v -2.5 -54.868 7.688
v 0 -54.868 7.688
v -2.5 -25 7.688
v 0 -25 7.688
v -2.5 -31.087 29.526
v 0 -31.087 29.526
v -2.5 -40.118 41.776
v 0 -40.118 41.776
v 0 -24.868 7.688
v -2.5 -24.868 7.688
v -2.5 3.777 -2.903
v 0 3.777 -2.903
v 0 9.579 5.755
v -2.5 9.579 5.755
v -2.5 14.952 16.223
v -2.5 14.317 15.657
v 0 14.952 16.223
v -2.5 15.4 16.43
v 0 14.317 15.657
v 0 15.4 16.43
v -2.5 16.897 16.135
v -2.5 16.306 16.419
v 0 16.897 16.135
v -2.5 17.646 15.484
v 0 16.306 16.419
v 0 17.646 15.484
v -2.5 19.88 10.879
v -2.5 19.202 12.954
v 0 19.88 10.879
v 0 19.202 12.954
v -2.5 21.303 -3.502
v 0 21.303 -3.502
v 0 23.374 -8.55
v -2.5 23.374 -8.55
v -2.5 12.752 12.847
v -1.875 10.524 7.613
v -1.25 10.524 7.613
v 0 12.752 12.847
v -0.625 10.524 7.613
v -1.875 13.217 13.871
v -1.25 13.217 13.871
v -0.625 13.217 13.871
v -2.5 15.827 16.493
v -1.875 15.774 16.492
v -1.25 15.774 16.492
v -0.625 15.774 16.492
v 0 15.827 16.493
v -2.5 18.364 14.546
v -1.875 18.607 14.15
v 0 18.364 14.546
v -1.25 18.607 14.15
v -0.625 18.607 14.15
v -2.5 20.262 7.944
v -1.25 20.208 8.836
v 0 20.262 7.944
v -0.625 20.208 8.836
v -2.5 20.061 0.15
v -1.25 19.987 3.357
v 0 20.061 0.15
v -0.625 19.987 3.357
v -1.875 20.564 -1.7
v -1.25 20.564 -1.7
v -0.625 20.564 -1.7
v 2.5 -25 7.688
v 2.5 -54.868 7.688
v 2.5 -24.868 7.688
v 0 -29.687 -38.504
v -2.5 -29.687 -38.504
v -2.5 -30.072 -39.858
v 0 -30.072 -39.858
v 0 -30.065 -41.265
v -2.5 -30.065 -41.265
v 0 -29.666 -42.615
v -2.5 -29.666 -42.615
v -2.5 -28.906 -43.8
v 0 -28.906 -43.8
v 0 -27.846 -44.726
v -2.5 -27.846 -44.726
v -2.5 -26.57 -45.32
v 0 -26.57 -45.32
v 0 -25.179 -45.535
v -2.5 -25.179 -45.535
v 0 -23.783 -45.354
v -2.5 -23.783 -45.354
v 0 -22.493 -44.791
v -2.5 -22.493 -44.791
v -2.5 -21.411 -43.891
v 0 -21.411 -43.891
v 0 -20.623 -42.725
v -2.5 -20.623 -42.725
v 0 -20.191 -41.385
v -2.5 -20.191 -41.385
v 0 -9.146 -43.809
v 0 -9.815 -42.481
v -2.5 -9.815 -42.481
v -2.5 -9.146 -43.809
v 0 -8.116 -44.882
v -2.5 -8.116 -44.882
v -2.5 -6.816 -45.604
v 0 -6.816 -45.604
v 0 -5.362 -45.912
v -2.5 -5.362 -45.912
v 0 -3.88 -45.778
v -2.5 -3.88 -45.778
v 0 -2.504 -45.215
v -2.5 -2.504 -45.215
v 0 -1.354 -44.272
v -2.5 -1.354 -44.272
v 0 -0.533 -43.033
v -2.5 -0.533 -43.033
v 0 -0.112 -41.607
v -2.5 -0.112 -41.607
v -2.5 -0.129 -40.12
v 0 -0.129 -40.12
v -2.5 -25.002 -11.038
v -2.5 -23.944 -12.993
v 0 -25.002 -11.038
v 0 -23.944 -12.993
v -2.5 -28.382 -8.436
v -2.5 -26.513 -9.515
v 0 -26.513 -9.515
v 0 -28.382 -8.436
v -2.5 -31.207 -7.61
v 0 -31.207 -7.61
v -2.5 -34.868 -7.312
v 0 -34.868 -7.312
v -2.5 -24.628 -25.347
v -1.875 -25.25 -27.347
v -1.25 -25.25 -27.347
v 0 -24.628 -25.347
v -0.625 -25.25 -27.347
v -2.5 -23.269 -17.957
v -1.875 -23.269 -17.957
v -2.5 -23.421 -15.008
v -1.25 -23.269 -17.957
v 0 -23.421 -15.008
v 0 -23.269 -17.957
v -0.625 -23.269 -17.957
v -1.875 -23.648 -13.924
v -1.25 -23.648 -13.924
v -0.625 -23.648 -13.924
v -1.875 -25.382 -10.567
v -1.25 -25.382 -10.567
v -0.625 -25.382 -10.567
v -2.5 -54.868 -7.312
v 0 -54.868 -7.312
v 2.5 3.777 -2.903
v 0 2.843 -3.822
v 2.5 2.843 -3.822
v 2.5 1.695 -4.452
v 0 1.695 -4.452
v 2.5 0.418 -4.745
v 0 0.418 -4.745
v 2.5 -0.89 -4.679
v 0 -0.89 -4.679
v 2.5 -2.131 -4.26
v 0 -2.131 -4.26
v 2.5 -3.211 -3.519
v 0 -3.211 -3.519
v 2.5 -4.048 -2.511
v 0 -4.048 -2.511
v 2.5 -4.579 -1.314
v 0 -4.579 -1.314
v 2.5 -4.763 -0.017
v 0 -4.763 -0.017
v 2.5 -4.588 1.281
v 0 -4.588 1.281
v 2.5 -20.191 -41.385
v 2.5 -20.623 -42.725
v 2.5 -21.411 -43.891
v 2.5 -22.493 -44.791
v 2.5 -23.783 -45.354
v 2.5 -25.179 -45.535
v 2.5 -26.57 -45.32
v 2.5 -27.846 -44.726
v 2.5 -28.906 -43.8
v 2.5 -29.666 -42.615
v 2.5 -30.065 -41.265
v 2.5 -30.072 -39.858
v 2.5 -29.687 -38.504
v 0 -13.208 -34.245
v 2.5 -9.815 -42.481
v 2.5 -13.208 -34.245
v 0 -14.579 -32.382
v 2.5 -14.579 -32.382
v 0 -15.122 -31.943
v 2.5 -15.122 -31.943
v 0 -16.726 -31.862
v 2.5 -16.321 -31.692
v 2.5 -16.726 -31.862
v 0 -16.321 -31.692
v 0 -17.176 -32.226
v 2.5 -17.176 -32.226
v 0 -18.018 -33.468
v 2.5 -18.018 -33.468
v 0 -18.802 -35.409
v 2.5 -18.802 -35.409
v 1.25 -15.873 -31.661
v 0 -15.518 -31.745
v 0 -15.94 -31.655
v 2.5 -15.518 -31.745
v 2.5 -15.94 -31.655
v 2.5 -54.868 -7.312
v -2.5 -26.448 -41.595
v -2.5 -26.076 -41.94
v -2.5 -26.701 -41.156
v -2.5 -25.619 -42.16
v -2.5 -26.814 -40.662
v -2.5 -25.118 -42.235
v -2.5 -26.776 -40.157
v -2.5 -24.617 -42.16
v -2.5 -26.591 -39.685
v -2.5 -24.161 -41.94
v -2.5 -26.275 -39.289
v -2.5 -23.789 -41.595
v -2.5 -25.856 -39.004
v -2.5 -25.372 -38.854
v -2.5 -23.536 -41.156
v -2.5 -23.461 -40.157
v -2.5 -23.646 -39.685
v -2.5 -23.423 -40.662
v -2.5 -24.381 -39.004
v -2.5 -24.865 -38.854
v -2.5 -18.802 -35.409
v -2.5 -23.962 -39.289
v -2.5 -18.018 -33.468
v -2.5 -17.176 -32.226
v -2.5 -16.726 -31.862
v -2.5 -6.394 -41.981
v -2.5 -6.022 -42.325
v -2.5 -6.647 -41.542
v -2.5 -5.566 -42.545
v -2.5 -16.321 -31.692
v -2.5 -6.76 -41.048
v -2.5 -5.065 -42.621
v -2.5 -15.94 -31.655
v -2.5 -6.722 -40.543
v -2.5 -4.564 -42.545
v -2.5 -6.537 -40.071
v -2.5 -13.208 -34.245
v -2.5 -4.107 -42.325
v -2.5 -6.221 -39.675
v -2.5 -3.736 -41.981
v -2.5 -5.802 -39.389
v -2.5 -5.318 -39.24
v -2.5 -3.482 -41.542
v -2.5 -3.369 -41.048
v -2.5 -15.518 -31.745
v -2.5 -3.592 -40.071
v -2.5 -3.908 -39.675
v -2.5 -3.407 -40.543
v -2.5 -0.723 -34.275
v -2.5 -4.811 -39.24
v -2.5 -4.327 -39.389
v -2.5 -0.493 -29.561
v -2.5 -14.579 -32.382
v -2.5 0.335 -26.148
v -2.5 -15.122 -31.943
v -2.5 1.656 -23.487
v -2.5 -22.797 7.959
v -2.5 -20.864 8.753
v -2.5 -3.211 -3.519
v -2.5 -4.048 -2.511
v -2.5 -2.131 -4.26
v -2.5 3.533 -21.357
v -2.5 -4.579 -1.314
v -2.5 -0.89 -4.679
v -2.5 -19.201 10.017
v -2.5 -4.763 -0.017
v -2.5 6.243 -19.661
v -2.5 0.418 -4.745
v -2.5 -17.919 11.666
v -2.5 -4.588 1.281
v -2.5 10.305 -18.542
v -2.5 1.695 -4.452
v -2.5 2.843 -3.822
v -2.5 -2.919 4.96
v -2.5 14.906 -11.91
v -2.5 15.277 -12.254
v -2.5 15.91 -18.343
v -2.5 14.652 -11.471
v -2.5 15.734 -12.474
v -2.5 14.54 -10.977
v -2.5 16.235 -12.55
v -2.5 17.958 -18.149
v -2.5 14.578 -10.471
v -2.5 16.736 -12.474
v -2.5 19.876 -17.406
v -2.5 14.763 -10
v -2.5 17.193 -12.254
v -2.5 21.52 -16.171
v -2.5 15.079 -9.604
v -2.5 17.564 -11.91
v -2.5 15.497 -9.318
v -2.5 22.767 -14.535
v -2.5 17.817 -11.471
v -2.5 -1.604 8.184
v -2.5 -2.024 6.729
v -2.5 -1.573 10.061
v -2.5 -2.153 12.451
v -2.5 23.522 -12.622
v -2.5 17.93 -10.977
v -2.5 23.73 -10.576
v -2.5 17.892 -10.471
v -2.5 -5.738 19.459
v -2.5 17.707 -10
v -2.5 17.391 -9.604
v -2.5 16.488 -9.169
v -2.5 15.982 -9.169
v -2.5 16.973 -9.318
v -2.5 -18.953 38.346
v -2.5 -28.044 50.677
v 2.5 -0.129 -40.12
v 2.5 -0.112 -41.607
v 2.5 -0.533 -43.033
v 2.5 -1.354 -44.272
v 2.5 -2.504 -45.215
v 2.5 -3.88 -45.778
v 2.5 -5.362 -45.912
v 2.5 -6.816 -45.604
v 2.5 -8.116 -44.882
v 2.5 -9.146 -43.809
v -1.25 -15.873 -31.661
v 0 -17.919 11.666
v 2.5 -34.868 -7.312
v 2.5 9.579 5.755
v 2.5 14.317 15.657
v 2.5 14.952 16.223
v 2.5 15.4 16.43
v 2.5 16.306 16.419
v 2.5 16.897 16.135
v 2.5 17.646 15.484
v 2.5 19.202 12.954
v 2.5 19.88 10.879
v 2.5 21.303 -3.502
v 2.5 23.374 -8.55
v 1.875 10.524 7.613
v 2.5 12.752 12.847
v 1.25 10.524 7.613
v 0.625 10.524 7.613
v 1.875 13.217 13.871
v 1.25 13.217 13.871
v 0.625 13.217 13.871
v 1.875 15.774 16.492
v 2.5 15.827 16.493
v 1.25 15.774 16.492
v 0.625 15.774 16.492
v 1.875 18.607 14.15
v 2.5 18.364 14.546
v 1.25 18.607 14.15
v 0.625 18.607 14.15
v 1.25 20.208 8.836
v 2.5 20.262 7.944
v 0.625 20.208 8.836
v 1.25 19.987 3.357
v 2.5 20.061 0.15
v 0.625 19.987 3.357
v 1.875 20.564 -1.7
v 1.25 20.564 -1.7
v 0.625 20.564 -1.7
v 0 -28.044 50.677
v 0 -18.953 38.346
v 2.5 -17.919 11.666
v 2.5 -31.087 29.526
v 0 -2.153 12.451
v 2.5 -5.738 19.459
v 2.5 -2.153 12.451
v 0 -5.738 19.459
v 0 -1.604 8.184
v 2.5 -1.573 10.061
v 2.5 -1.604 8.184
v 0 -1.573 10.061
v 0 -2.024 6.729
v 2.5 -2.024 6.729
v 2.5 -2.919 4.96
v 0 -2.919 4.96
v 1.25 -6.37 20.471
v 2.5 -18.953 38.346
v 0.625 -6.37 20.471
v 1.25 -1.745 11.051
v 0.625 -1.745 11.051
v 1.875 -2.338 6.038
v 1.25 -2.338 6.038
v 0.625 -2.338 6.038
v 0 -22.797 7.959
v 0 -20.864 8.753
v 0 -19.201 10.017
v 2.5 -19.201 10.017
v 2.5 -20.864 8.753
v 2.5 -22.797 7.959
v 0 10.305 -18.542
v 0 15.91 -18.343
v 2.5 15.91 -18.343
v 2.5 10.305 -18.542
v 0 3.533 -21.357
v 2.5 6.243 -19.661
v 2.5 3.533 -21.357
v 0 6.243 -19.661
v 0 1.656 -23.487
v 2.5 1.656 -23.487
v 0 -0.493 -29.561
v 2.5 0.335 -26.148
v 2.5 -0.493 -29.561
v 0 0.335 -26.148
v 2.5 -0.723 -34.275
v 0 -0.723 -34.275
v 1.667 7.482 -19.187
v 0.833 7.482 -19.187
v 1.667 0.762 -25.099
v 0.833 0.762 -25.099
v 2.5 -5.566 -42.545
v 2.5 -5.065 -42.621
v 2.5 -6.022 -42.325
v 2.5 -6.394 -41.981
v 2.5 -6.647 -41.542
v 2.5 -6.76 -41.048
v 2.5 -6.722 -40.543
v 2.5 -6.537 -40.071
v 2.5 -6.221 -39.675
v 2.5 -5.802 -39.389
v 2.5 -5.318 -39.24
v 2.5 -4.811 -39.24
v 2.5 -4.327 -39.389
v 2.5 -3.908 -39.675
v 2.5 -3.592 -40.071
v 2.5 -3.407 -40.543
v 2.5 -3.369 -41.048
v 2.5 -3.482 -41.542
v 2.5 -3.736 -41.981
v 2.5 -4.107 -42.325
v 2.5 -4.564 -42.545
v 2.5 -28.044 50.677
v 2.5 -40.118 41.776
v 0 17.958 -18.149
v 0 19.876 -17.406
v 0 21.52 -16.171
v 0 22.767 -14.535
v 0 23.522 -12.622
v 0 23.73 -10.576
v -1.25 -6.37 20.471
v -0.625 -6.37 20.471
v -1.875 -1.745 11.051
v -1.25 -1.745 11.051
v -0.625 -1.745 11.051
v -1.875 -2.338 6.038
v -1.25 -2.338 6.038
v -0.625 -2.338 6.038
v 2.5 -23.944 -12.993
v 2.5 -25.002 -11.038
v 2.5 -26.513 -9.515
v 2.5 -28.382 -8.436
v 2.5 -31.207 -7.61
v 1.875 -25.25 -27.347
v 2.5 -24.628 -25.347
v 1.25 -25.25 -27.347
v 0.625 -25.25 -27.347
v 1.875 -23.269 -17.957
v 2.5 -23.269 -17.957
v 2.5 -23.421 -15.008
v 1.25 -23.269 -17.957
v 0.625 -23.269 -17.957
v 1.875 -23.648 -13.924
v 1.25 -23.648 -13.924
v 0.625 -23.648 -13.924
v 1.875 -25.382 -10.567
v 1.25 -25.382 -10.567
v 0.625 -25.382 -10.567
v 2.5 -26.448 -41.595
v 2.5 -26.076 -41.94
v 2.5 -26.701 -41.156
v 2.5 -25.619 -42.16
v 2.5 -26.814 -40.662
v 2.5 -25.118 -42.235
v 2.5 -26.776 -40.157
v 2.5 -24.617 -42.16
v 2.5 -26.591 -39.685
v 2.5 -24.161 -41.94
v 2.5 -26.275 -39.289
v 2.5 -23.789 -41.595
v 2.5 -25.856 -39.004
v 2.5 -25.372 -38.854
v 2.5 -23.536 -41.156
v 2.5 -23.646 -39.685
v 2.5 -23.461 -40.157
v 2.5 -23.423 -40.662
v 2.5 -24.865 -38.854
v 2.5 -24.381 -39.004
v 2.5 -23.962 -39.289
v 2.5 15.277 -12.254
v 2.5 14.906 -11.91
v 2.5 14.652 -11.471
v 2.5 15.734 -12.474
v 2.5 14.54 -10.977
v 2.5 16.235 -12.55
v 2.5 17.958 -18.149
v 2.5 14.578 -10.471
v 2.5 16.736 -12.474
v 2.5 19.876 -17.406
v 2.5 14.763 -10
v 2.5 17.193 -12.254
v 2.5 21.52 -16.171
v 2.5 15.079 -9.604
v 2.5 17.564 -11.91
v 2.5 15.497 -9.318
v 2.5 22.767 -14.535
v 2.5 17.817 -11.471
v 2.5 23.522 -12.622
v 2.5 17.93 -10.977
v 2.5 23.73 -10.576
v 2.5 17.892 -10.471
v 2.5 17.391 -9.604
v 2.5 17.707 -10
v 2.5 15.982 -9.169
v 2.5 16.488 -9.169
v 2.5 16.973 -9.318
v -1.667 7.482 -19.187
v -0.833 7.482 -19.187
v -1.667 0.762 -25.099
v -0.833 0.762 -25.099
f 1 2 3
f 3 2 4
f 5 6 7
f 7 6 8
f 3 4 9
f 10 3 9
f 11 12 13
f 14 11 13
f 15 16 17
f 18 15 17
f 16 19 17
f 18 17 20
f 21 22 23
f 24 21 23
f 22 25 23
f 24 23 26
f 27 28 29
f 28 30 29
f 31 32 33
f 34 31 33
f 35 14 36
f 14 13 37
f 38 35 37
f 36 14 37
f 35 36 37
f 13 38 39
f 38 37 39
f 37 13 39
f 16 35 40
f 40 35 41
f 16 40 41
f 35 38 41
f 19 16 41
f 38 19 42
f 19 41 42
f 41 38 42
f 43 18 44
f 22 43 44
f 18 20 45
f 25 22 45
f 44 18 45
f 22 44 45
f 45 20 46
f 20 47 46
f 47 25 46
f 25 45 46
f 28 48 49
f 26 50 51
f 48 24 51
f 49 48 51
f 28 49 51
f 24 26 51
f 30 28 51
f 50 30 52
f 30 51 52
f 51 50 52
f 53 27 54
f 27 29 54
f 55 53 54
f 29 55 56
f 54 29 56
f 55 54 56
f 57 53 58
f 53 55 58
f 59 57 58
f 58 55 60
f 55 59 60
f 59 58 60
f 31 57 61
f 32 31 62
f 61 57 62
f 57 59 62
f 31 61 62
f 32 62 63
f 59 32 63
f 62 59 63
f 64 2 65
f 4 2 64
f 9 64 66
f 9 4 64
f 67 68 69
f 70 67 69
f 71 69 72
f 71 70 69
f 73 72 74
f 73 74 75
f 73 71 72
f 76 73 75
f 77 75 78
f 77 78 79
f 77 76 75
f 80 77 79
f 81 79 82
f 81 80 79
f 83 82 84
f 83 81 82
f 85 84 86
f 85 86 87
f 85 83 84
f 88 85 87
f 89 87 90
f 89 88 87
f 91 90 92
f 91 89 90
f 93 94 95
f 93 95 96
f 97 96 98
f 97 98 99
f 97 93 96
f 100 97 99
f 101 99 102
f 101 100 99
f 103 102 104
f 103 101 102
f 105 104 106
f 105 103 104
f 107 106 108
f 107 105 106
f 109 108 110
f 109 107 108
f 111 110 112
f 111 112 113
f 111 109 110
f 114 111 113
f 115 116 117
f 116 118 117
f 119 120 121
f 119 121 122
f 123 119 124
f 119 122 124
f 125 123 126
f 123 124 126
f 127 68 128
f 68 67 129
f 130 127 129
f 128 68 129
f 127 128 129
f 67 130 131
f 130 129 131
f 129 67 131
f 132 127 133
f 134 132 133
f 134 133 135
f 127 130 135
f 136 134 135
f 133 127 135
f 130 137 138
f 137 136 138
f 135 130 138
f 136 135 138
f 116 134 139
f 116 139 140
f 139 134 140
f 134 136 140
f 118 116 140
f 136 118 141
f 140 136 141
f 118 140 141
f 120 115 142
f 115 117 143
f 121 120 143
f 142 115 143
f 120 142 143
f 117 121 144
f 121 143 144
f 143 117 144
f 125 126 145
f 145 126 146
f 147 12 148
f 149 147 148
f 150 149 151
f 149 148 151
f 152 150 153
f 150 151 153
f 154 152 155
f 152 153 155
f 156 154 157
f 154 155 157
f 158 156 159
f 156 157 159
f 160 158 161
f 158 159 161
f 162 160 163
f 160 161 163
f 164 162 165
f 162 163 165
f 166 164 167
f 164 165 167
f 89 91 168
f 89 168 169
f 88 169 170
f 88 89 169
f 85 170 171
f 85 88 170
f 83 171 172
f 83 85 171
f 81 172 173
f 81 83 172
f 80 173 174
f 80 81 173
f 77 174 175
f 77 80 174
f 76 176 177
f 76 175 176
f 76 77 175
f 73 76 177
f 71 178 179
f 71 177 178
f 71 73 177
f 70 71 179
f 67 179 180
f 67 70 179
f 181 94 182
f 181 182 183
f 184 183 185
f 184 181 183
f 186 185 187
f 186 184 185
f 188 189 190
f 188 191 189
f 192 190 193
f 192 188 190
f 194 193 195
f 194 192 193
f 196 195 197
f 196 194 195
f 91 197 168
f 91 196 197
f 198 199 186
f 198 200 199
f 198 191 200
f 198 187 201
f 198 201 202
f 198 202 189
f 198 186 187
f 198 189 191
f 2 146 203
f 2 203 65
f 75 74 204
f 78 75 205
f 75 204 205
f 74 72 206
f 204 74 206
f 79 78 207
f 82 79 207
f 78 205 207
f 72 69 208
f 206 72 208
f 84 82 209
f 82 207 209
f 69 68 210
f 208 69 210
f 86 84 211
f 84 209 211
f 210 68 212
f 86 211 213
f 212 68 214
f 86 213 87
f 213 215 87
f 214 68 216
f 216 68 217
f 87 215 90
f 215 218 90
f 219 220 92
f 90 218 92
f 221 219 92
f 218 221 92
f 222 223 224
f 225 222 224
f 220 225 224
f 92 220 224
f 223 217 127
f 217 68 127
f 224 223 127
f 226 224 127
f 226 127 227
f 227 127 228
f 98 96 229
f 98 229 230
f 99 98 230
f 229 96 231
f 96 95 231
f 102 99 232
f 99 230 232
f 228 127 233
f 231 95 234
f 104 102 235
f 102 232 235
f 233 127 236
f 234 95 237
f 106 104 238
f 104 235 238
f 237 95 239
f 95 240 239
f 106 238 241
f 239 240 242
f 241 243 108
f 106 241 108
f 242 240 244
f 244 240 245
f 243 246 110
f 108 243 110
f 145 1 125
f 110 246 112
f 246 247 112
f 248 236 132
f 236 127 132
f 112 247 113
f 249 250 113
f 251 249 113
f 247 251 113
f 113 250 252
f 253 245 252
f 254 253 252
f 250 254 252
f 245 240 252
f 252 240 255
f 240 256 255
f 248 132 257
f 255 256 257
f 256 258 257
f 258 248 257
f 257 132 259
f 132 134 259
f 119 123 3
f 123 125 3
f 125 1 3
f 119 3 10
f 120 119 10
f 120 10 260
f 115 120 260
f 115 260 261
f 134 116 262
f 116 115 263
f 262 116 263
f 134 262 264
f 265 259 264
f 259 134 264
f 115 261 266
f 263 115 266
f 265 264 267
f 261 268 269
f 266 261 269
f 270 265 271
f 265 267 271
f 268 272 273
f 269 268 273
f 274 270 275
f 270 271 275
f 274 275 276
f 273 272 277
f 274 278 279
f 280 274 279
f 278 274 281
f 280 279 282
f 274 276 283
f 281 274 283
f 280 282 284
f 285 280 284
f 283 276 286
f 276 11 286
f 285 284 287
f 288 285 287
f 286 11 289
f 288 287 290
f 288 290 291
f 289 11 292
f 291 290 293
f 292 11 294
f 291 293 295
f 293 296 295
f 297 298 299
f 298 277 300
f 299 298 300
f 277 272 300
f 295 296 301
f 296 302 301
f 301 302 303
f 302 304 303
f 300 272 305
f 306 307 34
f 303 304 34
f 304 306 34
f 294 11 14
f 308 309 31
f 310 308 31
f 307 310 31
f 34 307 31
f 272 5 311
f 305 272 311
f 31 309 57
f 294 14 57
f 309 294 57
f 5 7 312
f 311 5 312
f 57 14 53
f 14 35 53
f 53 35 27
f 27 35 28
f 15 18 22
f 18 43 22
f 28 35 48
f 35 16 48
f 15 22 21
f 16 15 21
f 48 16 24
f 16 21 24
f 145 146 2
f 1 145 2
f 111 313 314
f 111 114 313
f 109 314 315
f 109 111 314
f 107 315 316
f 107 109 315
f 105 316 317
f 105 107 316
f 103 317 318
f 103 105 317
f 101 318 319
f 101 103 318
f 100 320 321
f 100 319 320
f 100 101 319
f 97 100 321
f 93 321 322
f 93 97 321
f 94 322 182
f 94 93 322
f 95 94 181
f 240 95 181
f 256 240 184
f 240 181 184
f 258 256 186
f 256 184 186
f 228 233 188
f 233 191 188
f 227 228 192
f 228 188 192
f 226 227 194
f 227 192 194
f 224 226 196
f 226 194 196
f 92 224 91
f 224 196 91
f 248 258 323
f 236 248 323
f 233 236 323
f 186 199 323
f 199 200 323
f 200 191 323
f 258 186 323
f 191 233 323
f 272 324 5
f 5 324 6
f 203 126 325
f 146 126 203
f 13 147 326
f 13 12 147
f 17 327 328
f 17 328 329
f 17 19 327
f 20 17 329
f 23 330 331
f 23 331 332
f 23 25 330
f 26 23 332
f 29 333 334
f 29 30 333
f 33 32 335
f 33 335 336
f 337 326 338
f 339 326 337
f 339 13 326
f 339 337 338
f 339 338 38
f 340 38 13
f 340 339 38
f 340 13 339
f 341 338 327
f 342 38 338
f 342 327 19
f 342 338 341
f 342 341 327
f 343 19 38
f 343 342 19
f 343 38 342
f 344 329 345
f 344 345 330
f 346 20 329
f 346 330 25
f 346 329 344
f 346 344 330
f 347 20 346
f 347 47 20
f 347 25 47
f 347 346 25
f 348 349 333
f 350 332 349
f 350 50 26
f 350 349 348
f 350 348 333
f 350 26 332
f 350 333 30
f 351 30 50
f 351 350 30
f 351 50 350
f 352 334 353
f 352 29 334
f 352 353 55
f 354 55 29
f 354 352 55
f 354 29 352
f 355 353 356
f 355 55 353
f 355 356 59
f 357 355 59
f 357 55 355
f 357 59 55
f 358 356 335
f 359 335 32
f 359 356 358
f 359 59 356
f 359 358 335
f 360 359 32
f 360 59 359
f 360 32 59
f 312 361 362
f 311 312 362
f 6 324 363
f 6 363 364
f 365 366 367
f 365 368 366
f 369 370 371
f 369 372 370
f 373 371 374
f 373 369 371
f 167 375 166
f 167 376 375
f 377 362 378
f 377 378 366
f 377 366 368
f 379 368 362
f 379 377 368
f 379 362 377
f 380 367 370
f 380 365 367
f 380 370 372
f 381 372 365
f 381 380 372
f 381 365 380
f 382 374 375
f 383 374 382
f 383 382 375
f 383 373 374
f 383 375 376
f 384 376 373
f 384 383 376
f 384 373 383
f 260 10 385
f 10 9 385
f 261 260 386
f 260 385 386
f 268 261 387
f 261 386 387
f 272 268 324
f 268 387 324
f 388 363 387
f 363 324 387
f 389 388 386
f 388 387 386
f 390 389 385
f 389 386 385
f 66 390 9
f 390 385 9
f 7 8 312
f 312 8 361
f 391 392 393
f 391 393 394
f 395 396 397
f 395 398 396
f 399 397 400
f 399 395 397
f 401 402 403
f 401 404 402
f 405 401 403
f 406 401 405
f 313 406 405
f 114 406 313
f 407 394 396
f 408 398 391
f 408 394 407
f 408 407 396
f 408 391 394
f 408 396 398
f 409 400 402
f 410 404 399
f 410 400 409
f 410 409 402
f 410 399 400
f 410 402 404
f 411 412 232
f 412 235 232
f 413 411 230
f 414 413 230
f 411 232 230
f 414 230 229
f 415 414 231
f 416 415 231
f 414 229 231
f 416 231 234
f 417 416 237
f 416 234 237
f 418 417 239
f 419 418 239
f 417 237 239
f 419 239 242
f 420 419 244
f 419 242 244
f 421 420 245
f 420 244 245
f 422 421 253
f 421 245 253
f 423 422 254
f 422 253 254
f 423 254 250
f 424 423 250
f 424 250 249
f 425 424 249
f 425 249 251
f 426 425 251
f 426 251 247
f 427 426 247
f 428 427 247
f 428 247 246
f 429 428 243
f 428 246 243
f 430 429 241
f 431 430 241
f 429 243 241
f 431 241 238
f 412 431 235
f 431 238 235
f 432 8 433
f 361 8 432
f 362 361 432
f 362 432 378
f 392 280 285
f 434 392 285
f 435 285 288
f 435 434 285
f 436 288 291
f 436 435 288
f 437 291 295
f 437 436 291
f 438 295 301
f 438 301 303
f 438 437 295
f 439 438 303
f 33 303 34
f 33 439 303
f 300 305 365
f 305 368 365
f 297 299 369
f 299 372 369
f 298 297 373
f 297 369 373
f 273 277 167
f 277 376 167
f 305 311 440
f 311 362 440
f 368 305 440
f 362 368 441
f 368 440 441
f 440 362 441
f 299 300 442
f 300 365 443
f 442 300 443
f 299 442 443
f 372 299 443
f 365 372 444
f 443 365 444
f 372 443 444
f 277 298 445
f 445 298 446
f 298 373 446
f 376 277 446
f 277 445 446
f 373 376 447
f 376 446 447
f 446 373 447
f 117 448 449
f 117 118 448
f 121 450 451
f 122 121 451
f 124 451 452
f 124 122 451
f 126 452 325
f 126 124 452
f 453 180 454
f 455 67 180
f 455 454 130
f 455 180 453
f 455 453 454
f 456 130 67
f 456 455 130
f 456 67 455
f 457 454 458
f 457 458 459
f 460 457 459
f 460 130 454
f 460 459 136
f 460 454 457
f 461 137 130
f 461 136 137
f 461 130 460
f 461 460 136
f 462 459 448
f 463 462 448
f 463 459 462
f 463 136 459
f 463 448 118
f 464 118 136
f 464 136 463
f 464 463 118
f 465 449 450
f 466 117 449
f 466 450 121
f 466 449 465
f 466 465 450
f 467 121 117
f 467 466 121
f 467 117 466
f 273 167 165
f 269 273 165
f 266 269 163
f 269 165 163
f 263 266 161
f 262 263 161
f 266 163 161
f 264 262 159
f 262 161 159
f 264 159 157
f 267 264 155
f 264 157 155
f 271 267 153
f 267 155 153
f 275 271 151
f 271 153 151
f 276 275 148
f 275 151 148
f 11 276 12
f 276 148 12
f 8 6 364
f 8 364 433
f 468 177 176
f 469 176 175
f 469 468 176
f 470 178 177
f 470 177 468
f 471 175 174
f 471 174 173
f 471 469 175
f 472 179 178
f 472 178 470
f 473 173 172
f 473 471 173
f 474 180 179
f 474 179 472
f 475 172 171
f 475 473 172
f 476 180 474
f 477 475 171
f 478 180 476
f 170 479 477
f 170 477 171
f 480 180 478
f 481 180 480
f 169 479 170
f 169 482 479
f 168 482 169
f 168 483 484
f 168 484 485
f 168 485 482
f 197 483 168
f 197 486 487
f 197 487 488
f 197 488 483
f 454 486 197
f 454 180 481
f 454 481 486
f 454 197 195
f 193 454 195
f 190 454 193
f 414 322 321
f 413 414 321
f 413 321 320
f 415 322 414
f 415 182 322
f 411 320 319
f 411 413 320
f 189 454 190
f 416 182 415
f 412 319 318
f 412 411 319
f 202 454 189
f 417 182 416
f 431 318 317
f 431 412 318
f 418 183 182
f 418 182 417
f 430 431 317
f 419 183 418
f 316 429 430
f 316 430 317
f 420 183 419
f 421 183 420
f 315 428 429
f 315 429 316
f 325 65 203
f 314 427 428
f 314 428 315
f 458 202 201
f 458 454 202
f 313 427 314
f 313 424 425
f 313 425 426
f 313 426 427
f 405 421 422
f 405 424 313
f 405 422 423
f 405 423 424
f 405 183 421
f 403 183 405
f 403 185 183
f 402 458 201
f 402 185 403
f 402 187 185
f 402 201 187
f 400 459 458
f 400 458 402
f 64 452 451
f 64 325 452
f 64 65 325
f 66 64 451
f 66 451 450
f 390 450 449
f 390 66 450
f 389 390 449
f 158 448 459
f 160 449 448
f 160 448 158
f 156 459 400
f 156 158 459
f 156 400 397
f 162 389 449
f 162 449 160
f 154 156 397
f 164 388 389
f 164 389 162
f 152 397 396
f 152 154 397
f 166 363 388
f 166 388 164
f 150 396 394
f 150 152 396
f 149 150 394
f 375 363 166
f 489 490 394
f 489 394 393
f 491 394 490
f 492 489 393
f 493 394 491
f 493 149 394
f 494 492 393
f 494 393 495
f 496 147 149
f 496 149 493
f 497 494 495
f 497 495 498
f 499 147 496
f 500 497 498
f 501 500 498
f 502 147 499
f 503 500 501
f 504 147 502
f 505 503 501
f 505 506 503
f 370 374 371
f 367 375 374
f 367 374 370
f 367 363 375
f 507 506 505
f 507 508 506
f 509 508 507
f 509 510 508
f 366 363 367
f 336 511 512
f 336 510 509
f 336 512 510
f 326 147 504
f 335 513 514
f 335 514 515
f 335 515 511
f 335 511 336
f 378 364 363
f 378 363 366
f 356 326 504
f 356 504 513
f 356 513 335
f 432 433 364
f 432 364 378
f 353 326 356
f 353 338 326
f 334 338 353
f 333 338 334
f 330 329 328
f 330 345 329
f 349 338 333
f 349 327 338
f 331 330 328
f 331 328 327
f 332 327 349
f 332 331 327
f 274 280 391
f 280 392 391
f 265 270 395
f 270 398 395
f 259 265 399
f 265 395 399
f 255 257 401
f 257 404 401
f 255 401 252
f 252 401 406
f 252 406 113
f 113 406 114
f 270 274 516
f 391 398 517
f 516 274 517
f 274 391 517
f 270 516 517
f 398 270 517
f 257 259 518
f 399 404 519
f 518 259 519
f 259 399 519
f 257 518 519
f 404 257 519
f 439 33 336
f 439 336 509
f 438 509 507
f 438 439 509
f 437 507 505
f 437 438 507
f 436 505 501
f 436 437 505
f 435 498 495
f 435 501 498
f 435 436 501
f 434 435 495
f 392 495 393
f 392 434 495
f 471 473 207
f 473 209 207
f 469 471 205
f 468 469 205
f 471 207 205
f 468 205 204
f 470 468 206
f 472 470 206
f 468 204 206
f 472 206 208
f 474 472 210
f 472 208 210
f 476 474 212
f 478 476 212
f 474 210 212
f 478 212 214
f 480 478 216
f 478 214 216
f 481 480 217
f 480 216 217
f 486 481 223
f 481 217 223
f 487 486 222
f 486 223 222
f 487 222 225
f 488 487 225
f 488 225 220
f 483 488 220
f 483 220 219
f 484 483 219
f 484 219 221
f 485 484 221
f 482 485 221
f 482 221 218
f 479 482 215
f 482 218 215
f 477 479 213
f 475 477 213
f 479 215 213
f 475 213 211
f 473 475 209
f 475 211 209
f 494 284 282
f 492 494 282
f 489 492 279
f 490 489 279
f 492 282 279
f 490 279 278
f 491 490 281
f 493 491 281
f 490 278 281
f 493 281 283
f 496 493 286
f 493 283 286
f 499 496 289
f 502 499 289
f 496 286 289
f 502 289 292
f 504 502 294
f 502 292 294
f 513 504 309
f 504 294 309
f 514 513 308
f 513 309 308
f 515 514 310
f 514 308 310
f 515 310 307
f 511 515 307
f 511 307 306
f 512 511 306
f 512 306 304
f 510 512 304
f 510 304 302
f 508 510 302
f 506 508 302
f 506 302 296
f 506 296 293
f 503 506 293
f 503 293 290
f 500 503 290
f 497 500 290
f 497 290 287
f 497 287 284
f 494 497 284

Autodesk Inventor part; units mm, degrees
ref_plane "YZ Plane" through (0, 0, 0) normal (1, 0, 0) x (0, 1, 0)
ref_plane "XZ Plane" through (0, 0, 0) normal (0, 1, 0) x (-1, 0, 0)
ref_plane "XY Plane" through (0, 0, 0) normal (0, 0, 1) x (1, 0, 0)
sketch "Boceto1" plane through (0, 0, 0) normal (1, 0, 0) x (0, 1, 0)
  line L0 (-20.1912, -7.3118) -> (-34.868, -7.3118) construction
  spline S0 degree 4 poles (-29.6871, -38.5039) (-24.1556, -26.0638) (-21.7281, -18) (-20.1912, -7.3118) (-34.868, -7.3118) knots 21.570729 21.570729 21.570729 21.570729 21.570729 22 22 22 22 22
  line L1 (-29.6871, -38.5039) -> (-24.1556, -26.0638) construction
  line L2 (-24.1556, -26.0638) -> (-21.7281, -18) construction
  line L3 (-21.7281, -18) -> (-20.1912, -7.3118) construction
  line L4 (-50, 13.9603) -> (0, 0) construction
  line L5 (0, 0) -> (-50, 0) construction
  arc A0 (-29.6871, -38.5039) -> (-20.1912, -41.3852) centre (-25.1184, -40.5354) ccw
  line L6 (-16.7423, -21.3881) -> (-20.1912, -41.3852) construction
  spline S1 degree 2 poles (-9.815, -42.481) (-16.7423, -21.3881) (-20.1912, -41.3852) knots 1 1 1 2 2 2
  line L7 (-9.815, -42.481) -> (-16.7423, -21.3881) construction
  line L8 (2.3245, 8.0391) -> (-2.902, 7.319) construction
  spline S2 degree 4 poles (-18.9531, 38.3459) (-1.6814, 14.9192) (2.3245, 8.0391) (-2.902, 7.319) (-4.5878, 1.2809) knots 1 1 1 1 1 2 2 2 2 2
  line L9 (-18.9531, 38.3459) -> (-1.6814, 14.9192) construction
  line L10 (-1.6814, 14.9192) -> (2.3245, 8.0391) construction
  line L11 (-2.902, 7.319) -> (-4.5878, 1.2809) construction
  line L12 (3.7767, -2.9026) -> (9.4181, 4.4375) construction
  spline S3 degree 4 poles (3.7767, -2.9026) (9.4181, 4.4375) (12.4291, 11.3201) (14.6356, 22.4473) (23.4504, 7.8788) (17.807, 0.7674) (21.8821, -3.919) (23.3738, -8.5503) knots 0 0 0 0 0 1 2 3 4 4 4 4 4
  line L13 (9.4181, 4.4375) -> (12.4291, 11.3201) construction
  line L14 (12.4291, 11.3201) -> (14.6356, 22.4473) construction
  line L15 (14.6356, 22.4473) -> (23.4504, 7.8788) construction
  line L16 (23.4504, 7.8788) -> (17.807, 0.7674) construction
  line L17 (17.807, 0.7674) -> (21.8821, -3.919) construction
  line L18 (21.8821, -3.919) -> (23.3738, -8.5503) construction
  circle A1 centre (0, 0) radius 4.7633
  arc A2 (15.9103, -18.3426) -> (23.3738, -8.5503) centre (16.2349, -10.8497) ccw
  line L19 (-34.0809, 46.2261) -> (0, 0) construction
  arc A3 (-9.815, -42.481) -> (-0.1292, -40.1199) centre (-5.0647, -40.9208) ccw
  line L20 (-3.5244, -19.1976) -> (-0.1292, -40.1199) construction
  spline S4 degree 3 poles (15.9103, -18.3426) (8, -18) (-3.5244, -19.1976) (-0.1292, -40.1199) knots 1 1 1 1 2 2 2 2
  line L21 (15.9103, -18.3426) -> (8, -18) construction
  line L22 (8, -18) -> (-3.5244, -19.1976) construction
  line L23 (-31.0868, 29.5264) -> (-40.1176, 41.7755)
  line L24 (-28.0441, 50.6768) -> (-18.9531, 38.3459)
  line L25 (-40.1176, 41.7755) -> (-28.0441, 50.6768)
  line L26 (-34.868, -7.3118) -> (-54.868, -7.3118)
  line L27 (-54.868, -7.3118) -> (-54.868, 7.6882)
  line L28 (-54.868, 7.6882) -> (-25, 7.6882)
  line L29 (-25, 7.6882) -> (-24.868, 7.6882)
  arc A4 (-24.868, 7.6882) -> (-17.9191, 11.6663) centre (-24.868, 15.7464) ccw
  line L30 (-17.9191, 11.6663) -> (-31.0868, 29.5264)
  point P0 (3.7768, -2.9026)
  dimension "d1" = 38
  dimension "d3" = 9.5266
  dimension "d4" = 15
  dimension "d5" = 10
  dimension "d6" = 10
  dimension "d7" = 344.4
  dimension "d25" = 20
  dimension "d26" = 15
  dimension "d28" = 15
  dimension "d29" = 30
  dimension "d30" = 30
extrude "Extrusión1" add sketch "Boceto1" along normal mid plane 5 contours S0 L26 L27 L28 L29 A4 L30 L23 L25 L24 S2 A1 S3 A2 S4 A3 S1 A0
sketch "Boceto2" plane through (2.5, 0, 0) normal (1, 0, 0) x (0, 0, -1)
  arc A0 (18.3426, 15.9103) -> (8.5503, 23.3738) centre (10.8497, 16.2349) ccw projected
  point P0 (0, 0)
hole "Agujero1" at (2.5, 16.2349, -10.8497) direction (-1, 0, 0) diameter 3.4 end through all clearance for "Tornillo para maquinaria de cabeza plana" size "M3" standard "Perfil M métrico ANSI"
sketch "Boceto3" plane through (2.5, 0, 0) normal (1, 0, 0) x (0, 0, -1)
  arc A0 (42.481, -9.815) -> (40.1199, -0.1292) centre (40.9208, -5.0647) ccw projected
  arc A1 (38.5039, -29.6871) -> (41.3852, -20.1912) centre (40.5354, -25.1184) ccw projected
  point P0 (0, 0)
hole "Agujero2" at (2.5, -5.0647, -40.9208) at (2.5, -25.1184, -40.5354) direction (-1, 0, 0) diameter 3.4 end through all clearance for "Tornillo para maquinaria de cabeza plana" size "M3" standard "Perfil M métrico ANSI"
properties part number "lamina_eje_trasero"
